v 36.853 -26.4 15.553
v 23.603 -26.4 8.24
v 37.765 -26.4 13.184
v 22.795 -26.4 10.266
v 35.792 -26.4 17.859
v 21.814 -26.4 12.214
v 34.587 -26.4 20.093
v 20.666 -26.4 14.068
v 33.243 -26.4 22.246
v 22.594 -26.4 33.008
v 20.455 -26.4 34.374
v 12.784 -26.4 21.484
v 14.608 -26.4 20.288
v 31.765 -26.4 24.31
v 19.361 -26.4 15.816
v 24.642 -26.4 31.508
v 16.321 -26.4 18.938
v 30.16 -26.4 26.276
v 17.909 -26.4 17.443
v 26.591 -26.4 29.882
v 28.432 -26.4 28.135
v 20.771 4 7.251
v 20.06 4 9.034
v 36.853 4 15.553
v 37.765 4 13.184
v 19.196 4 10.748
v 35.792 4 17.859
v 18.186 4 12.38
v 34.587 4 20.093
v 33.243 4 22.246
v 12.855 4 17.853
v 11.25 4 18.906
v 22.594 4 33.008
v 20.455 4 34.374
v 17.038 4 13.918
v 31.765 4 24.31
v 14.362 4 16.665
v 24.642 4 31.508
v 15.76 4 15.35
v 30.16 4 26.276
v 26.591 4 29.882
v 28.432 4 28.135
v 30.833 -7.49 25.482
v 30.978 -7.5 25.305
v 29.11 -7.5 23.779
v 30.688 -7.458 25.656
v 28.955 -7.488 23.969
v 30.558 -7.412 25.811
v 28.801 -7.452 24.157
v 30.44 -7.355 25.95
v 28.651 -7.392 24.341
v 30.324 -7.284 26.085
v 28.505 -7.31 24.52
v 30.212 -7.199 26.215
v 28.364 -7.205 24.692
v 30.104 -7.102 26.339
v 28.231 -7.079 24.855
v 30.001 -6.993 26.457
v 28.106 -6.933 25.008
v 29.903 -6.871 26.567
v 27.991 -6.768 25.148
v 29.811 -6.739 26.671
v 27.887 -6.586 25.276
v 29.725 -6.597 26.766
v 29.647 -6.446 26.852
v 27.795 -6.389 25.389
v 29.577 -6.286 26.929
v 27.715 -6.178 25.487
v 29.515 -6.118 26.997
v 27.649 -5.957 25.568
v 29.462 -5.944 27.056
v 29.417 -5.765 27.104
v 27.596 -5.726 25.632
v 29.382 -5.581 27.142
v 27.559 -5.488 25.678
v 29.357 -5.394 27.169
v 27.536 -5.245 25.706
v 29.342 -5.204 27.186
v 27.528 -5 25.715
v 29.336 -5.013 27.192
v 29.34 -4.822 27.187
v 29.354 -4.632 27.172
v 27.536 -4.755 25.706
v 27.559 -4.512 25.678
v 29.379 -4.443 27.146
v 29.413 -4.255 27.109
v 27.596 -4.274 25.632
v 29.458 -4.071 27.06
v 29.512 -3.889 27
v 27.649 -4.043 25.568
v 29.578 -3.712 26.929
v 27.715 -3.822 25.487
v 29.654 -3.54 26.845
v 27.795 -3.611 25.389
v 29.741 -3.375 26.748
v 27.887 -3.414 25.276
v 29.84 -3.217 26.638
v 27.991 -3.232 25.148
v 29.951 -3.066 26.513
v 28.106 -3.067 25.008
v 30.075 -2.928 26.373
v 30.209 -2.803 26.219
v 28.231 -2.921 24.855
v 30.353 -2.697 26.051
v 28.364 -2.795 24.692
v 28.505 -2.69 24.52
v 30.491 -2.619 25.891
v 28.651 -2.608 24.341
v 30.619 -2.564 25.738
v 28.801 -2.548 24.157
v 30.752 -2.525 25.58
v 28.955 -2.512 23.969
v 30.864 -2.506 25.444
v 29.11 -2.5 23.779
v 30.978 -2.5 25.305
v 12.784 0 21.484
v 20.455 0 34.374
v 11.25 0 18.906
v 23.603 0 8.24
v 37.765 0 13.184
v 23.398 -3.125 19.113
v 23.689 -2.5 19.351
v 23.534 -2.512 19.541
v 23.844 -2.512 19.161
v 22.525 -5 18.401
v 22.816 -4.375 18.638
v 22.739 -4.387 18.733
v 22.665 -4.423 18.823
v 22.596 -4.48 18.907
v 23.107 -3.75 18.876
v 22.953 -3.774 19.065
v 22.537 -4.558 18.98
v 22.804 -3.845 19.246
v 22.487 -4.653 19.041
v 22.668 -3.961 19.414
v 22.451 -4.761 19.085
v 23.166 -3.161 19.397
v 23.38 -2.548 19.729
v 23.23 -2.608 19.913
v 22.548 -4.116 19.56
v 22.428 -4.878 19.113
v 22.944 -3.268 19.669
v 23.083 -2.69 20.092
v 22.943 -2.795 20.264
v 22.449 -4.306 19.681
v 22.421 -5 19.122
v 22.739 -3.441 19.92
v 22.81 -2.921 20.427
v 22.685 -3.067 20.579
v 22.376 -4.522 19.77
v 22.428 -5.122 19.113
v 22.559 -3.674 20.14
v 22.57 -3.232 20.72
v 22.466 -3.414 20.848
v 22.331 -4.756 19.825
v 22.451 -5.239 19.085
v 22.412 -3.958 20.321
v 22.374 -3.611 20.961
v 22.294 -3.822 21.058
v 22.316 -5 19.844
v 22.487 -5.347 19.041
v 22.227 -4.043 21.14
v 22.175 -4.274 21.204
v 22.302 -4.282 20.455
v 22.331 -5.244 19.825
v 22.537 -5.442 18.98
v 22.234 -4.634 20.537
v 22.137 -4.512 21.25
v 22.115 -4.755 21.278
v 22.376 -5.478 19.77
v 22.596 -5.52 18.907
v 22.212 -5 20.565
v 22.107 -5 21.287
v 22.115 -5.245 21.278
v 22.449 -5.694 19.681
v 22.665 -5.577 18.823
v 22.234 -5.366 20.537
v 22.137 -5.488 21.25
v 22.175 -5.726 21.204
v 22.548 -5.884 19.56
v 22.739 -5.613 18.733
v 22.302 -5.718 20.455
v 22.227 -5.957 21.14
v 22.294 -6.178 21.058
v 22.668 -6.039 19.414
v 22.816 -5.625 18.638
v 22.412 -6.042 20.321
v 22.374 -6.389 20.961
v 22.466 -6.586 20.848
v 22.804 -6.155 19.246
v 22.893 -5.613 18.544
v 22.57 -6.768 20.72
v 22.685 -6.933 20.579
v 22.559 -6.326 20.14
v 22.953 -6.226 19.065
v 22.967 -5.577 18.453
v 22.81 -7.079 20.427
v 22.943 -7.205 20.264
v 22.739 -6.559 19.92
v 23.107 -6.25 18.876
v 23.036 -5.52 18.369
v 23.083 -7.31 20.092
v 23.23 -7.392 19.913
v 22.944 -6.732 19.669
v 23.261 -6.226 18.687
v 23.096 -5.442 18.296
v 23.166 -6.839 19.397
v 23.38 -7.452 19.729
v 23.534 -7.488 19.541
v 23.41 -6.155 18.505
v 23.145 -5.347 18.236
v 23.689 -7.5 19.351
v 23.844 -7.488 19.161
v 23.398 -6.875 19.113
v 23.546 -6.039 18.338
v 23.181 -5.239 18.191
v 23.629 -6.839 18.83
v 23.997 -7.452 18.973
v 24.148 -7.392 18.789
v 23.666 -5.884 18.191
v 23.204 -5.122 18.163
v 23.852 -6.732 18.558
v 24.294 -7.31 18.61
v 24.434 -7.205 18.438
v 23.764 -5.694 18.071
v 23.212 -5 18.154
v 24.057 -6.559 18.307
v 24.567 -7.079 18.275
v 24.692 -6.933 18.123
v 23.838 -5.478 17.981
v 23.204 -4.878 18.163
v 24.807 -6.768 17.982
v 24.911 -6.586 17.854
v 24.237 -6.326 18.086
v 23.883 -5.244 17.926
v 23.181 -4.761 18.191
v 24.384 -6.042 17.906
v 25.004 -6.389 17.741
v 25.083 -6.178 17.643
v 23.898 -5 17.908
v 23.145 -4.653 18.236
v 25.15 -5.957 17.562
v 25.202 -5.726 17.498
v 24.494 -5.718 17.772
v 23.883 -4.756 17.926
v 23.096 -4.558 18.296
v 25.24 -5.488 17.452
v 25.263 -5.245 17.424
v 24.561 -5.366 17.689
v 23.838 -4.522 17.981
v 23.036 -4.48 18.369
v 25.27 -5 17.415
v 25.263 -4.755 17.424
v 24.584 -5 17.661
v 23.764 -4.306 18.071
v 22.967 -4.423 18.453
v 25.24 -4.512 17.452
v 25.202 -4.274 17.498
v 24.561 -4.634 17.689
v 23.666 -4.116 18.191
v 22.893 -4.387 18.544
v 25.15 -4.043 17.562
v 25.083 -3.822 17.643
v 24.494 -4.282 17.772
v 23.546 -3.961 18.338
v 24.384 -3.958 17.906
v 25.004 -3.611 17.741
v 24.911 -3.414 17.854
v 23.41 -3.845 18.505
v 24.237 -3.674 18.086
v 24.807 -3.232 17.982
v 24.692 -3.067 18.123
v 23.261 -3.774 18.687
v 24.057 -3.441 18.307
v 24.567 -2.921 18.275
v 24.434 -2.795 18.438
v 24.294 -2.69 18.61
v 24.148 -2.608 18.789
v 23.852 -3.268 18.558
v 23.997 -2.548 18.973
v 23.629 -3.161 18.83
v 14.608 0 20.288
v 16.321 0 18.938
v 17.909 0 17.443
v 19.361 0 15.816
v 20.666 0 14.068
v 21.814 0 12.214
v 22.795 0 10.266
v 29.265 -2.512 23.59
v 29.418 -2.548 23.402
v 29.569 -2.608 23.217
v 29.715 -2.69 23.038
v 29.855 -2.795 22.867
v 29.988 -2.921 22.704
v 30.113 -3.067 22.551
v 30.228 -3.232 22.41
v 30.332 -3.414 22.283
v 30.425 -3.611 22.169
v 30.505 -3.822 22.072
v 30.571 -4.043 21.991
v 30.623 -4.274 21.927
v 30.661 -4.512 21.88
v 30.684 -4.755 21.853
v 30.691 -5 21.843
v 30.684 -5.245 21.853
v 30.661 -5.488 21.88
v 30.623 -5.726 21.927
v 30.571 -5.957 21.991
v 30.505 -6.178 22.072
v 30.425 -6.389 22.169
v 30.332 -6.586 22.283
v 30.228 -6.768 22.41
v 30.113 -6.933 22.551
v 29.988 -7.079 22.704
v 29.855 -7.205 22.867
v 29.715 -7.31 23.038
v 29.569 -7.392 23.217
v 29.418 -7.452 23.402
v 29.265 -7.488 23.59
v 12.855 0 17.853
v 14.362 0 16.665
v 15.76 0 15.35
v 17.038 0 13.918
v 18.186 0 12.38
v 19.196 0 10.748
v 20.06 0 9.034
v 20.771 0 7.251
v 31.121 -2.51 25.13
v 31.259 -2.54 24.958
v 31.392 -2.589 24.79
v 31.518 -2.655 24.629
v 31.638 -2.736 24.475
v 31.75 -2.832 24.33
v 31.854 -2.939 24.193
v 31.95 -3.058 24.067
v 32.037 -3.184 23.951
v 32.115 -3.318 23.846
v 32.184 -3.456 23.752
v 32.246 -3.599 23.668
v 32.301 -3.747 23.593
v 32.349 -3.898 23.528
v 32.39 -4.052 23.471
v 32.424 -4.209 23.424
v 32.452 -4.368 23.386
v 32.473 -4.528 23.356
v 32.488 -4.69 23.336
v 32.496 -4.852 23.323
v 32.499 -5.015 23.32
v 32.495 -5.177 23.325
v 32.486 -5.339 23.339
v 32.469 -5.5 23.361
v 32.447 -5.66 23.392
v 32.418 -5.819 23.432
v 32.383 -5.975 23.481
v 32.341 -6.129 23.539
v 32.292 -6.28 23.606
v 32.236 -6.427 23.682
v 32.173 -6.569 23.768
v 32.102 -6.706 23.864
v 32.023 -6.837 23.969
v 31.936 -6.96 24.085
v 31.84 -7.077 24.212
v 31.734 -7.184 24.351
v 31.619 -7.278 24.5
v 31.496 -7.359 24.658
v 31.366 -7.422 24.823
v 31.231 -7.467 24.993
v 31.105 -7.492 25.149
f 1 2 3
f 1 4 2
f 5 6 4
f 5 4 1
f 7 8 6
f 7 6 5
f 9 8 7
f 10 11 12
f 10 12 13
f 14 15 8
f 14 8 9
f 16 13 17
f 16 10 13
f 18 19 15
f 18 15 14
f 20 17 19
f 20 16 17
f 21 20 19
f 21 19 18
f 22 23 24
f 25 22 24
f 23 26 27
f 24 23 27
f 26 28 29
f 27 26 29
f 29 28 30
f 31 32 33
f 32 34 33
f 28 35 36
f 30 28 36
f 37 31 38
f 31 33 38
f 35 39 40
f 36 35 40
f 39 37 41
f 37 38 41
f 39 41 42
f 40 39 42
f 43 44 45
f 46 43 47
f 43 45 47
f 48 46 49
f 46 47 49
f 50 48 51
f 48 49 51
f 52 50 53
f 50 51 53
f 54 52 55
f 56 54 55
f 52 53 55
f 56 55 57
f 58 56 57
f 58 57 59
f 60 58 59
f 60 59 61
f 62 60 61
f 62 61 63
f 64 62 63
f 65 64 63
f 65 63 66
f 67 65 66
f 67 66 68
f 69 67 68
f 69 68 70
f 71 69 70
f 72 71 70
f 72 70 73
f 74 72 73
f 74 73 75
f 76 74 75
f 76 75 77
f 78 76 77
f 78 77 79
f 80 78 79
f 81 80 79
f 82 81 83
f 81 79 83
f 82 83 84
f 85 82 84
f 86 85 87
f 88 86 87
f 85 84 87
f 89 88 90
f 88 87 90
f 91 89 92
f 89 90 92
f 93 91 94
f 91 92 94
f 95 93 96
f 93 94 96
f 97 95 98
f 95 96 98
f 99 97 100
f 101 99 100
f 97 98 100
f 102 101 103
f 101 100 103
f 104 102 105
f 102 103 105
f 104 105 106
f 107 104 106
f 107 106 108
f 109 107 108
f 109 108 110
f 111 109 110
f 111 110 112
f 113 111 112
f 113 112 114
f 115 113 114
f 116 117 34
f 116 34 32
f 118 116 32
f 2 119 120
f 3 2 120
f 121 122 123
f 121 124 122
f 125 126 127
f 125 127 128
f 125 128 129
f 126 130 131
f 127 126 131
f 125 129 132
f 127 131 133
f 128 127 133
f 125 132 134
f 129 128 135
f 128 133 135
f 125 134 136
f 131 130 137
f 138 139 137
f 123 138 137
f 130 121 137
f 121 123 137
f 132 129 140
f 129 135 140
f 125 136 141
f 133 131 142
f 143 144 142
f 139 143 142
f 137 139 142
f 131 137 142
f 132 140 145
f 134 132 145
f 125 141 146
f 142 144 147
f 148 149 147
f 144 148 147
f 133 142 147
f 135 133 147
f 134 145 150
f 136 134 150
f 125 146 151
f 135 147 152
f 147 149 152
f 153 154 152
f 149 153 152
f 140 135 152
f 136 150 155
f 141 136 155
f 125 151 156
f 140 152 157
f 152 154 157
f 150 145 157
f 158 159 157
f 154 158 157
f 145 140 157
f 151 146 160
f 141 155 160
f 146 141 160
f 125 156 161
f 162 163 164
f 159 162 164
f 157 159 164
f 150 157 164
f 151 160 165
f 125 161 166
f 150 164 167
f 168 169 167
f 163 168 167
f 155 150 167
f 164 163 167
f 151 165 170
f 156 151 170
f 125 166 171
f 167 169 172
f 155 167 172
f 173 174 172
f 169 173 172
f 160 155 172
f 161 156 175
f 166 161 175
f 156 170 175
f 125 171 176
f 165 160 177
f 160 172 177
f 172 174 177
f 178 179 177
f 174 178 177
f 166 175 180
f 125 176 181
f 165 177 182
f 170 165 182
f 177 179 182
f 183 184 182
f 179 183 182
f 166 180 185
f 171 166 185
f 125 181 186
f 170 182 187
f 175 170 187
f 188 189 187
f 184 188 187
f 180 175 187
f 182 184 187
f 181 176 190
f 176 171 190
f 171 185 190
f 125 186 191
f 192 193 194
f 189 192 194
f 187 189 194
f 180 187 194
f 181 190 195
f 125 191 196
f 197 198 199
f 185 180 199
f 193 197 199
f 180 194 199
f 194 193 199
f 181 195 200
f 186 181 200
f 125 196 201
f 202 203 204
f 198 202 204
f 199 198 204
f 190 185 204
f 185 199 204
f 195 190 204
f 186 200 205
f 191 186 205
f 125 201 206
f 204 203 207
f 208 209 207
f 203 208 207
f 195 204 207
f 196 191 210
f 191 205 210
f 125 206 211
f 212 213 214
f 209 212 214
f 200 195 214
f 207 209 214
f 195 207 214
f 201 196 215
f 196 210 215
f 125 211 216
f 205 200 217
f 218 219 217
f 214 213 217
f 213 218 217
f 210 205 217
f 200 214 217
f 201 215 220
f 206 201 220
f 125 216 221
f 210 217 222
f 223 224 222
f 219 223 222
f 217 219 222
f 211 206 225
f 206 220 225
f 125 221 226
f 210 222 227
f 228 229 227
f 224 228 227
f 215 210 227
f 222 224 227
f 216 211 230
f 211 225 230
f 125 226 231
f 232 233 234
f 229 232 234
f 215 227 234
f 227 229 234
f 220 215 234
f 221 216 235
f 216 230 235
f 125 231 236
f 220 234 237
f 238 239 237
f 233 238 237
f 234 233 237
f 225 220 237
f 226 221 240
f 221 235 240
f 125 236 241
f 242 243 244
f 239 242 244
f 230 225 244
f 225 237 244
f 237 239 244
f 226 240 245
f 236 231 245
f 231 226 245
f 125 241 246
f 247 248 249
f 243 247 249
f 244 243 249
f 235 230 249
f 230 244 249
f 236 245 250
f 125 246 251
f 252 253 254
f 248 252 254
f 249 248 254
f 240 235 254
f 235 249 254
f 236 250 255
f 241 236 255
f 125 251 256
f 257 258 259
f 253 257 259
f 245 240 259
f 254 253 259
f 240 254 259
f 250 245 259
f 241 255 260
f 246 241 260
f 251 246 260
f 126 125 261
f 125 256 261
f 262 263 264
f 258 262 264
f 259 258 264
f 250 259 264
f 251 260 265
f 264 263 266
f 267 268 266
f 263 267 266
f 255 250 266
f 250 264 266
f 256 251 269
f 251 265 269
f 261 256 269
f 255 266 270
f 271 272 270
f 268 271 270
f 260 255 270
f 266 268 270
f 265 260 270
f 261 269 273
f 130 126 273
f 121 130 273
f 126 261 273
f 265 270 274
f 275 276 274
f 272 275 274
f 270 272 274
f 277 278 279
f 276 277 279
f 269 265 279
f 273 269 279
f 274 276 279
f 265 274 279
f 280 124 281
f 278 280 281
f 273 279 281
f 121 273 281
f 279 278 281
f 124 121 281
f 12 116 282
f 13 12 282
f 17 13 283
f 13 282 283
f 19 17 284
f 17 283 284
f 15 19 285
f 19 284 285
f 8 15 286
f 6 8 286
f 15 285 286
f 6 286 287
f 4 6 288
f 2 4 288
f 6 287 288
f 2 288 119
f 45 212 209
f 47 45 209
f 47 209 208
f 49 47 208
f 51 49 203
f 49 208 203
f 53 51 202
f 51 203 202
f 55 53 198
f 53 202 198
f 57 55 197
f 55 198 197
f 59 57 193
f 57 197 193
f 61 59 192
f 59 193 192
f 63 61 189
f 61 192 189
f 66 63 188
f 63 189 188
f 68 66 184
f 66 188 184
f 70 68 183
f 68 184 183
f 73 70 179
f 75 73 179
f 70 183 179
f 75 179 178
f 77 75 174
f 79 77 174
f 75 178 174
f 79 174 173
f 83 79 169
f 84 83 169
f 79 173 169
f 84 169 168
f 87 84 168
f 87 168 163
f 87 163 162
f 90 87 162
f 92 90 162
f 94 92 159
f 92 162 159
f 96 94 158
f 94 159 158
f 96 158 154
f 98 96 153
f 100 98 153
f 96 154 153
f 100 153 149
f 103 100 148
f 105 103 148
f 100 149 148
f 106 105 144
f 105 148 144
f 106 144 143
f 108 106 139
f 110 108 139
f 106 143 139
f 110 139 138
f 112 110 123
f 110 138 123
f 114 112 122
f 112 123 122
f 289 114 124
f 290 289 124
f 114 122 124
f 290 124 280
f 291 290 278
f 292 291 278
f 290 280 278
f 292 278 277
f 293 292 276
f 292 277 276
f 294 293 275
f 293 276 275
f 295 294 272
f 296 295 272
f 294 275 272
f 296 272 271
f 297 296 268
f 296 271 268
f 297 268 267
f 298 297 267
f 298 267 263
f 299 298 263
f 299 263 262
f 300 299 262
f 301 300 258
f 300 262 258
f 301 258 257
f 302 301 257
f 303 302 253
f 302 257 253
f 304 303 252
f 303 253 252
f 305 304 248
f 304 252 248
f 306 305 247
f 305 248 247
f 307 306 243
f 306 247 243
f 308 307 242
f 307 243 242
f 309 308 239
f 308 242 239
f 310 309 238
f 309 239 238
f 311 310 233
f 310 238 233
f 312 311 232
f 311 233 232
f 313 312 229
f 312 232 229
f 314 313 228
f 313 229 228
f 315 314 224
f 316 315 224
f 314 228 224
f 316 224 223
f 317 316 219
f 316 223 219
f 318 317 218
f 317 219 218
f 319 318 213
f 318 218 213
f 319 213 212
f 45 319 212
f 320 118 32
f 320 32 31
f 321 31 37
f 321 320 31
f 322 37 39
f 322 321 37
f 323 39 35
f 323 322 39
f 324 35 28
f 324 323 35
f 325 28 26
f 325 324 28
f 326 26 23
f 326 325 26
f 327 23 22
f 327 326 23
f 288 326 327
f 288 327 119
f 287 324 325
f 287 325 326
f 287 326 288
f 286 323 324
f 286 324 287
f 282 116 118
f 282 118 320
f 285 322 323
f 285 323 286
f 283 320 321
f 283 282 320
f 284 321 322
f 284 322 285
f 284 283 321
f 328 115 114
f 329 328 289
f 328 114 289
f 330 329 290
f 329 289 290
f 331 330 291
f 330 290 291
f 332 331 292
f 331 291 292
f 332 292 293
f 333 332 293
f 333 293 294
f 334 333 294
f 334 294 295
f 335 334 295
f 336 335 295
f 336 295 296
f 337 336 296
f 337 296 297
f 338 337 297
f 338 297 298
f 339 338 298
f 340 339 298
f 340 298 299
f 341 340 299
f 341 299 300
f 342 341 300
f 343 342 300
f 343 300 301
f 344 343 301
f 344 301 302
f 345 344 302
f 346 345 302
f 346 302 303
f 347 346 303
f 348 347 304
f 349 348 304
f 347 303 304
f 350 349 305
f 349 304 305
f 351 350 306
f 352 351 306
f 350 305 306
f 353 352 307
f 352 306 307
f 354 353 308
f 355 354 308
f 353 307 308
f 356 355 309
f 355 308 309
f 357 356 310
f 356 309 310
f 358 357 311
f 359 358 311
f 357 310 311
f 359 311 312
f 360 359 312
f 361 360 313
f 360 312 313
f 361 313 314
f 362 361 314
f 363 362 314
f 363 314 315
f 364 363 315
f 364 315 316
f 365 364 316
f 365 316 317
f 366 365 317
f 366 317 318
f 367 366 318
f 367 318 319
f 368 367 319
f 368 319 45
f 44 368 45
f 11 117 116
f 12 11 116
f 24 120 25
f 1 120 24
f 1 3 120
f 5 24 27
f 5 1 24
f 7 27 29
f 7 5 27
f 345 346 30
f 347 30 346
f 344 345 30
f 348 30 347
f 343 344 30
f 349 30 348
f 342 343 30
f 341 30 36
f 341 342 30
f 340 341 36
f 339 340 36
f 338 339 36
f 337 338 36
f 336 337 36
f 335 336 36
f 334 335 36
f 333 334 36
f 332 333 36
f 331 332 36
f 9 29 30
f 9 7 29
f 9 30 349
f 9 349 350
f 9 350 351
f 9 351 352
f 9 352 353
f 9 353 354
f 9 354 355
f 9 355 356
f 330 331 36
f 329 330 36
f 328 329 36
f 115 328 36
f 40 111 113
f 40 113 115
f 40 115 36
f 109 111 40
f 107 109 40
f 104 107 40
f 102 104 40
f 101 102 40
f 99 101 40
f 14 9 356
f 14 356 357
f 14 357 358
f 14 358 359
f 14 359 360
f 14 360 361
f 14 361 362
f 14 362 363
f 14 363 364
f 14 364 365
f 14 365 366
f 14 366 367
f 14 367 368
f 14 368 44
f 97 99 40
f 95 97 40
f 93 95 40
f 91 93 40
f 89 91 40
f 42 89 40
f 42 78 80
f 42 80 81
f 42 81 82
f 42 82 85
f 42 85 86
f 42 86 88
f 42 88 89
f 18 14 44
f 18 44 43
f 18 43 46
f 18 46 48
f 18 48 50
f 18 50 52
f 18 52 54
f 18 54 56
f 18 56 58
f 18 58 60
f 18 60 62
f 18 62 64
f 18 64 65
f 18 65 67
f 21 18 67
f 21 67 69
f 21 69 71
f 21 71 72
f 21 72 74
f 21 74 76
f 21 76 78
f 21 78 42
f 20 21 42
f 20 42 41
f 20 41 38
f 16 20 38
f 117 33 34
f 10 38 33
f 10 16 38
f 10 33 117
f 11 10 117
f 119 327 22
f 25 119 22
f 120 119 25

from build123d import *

# Parameters (mm, degrees)
F2_DEPTH = 26.4
F3_DEPTH = 4
F6_D     = 5
F6_DEPTH = 5
F6_TIP   = 1.5021515476
F7_D     = 5
F7_DEPTH = 7
F7_TIP   = 1.5021515476


with BuildPart() as f2:
    # F0 (on Front) → F2 (new body)
    with BuildSketch(Plane.XZ):
        with BuildLine():
            Line((23.6029717884, 8.2401288069), (37.7647548615, 13.1842060911))
            ThreePointArc((37.7647548615, 13.1842060911), (30.9779974122, 25.3054080451), (20.4548362885, 34.3744043208))
            Line((20.4548362885, 34.3744043208), (12.7842726803, 21.4840027005))
            ThreePointArc((12.7842726803, 21.4840027005), (19.3612483826, 15.8158800282), (23.6029717884, 8.2401288069))
        make_face()
    extrude(amount=F2_DEPTH)

    # F1 (on Front) + F0 (on Front) → F3 (join)
    with BuildSketch(Plane.XZ):
        with BuildLine():
            ThreePointArc((11.2501599587, 18.9059223764), (17.0378985767, 13.9179744248), (20.7706151738, 7.2513133501))
            Line((20.7706151738, 7.2513133501), (37.7647548615, 13.1842060911))
            ThreePointArc((37.7647548615, 13.1842060911), (30.9779974122, 25.3054080451), (20.4548362885, 34.3744043208))
            Line((20.4548362885, 34.3744043208), (11.2501599587, 18.9059223764))
        make_face()
    with BuildSketch(Plane.XZ):
        with BuildLine():
            Line((23.6029717884, 8.2401288069), (37.7647548615, 13.1842060911))
            ThreePointArc((37.7647548615, 13.1842060911), (30.9779974122, 25.3054080451), (20.4548362885, 34.3744043208))
            Line((20.4548362885, 34.3744043208), (12.7842726803, 21.4840027005))
            ThreePointArc((12.7842726803, 21.4840027005), (19.3612483826, 15.8158800282), (23.6029717884, 8.2401288069))
        make_face()
    extrude(amount=-F3_DEPTH)

    # F6 (one way)
    with BuildSketch(Plane(origin=(29.109795575, 0, 23.7793052059), x_dir=(0, 1, 0), z_dir=(-0.7744499353, 0, -0.6326352011))):
        with Locations((-5, 0)):
            Circle(F6_D / 2)
    extrude(amount=-F6_DEPTH, mode=Mode.SUBTRACT)
    with Locations(Plane(origin=(29.109795575, 0, 23.7793052059), x_dir=(0, 1, 0), z_dir=(-0.7744499353, 0, -0.6326352011))):
        with Locations((-5, 0)):
            with Locations((0, 0, -(F6_DEPTH + F6_TIP / 2))):  # 118° drill point
                Cone(0, F6_D / 2, F6_TIP, mode=Mode.SUBTRACT)

    # F7
    with Locations(Plane(origin=(29.109795575, 0, 23.7793052059), x_dir=(0, 1, 0), z_dir=(0.7744499353, 0, 0.6326352011))):
        with Locations((-5, 0)):
            Hole(F7_D / 2, depth=F7_DEPTH)
            with Locations((0, 0, -(F7_DEPTH + F7_TIP / 2))):  # 118° drill point
                Cone(0, F7_D / 2, F7_TIP, mode=Mode.SUBTRACT)


solid = f2.part
